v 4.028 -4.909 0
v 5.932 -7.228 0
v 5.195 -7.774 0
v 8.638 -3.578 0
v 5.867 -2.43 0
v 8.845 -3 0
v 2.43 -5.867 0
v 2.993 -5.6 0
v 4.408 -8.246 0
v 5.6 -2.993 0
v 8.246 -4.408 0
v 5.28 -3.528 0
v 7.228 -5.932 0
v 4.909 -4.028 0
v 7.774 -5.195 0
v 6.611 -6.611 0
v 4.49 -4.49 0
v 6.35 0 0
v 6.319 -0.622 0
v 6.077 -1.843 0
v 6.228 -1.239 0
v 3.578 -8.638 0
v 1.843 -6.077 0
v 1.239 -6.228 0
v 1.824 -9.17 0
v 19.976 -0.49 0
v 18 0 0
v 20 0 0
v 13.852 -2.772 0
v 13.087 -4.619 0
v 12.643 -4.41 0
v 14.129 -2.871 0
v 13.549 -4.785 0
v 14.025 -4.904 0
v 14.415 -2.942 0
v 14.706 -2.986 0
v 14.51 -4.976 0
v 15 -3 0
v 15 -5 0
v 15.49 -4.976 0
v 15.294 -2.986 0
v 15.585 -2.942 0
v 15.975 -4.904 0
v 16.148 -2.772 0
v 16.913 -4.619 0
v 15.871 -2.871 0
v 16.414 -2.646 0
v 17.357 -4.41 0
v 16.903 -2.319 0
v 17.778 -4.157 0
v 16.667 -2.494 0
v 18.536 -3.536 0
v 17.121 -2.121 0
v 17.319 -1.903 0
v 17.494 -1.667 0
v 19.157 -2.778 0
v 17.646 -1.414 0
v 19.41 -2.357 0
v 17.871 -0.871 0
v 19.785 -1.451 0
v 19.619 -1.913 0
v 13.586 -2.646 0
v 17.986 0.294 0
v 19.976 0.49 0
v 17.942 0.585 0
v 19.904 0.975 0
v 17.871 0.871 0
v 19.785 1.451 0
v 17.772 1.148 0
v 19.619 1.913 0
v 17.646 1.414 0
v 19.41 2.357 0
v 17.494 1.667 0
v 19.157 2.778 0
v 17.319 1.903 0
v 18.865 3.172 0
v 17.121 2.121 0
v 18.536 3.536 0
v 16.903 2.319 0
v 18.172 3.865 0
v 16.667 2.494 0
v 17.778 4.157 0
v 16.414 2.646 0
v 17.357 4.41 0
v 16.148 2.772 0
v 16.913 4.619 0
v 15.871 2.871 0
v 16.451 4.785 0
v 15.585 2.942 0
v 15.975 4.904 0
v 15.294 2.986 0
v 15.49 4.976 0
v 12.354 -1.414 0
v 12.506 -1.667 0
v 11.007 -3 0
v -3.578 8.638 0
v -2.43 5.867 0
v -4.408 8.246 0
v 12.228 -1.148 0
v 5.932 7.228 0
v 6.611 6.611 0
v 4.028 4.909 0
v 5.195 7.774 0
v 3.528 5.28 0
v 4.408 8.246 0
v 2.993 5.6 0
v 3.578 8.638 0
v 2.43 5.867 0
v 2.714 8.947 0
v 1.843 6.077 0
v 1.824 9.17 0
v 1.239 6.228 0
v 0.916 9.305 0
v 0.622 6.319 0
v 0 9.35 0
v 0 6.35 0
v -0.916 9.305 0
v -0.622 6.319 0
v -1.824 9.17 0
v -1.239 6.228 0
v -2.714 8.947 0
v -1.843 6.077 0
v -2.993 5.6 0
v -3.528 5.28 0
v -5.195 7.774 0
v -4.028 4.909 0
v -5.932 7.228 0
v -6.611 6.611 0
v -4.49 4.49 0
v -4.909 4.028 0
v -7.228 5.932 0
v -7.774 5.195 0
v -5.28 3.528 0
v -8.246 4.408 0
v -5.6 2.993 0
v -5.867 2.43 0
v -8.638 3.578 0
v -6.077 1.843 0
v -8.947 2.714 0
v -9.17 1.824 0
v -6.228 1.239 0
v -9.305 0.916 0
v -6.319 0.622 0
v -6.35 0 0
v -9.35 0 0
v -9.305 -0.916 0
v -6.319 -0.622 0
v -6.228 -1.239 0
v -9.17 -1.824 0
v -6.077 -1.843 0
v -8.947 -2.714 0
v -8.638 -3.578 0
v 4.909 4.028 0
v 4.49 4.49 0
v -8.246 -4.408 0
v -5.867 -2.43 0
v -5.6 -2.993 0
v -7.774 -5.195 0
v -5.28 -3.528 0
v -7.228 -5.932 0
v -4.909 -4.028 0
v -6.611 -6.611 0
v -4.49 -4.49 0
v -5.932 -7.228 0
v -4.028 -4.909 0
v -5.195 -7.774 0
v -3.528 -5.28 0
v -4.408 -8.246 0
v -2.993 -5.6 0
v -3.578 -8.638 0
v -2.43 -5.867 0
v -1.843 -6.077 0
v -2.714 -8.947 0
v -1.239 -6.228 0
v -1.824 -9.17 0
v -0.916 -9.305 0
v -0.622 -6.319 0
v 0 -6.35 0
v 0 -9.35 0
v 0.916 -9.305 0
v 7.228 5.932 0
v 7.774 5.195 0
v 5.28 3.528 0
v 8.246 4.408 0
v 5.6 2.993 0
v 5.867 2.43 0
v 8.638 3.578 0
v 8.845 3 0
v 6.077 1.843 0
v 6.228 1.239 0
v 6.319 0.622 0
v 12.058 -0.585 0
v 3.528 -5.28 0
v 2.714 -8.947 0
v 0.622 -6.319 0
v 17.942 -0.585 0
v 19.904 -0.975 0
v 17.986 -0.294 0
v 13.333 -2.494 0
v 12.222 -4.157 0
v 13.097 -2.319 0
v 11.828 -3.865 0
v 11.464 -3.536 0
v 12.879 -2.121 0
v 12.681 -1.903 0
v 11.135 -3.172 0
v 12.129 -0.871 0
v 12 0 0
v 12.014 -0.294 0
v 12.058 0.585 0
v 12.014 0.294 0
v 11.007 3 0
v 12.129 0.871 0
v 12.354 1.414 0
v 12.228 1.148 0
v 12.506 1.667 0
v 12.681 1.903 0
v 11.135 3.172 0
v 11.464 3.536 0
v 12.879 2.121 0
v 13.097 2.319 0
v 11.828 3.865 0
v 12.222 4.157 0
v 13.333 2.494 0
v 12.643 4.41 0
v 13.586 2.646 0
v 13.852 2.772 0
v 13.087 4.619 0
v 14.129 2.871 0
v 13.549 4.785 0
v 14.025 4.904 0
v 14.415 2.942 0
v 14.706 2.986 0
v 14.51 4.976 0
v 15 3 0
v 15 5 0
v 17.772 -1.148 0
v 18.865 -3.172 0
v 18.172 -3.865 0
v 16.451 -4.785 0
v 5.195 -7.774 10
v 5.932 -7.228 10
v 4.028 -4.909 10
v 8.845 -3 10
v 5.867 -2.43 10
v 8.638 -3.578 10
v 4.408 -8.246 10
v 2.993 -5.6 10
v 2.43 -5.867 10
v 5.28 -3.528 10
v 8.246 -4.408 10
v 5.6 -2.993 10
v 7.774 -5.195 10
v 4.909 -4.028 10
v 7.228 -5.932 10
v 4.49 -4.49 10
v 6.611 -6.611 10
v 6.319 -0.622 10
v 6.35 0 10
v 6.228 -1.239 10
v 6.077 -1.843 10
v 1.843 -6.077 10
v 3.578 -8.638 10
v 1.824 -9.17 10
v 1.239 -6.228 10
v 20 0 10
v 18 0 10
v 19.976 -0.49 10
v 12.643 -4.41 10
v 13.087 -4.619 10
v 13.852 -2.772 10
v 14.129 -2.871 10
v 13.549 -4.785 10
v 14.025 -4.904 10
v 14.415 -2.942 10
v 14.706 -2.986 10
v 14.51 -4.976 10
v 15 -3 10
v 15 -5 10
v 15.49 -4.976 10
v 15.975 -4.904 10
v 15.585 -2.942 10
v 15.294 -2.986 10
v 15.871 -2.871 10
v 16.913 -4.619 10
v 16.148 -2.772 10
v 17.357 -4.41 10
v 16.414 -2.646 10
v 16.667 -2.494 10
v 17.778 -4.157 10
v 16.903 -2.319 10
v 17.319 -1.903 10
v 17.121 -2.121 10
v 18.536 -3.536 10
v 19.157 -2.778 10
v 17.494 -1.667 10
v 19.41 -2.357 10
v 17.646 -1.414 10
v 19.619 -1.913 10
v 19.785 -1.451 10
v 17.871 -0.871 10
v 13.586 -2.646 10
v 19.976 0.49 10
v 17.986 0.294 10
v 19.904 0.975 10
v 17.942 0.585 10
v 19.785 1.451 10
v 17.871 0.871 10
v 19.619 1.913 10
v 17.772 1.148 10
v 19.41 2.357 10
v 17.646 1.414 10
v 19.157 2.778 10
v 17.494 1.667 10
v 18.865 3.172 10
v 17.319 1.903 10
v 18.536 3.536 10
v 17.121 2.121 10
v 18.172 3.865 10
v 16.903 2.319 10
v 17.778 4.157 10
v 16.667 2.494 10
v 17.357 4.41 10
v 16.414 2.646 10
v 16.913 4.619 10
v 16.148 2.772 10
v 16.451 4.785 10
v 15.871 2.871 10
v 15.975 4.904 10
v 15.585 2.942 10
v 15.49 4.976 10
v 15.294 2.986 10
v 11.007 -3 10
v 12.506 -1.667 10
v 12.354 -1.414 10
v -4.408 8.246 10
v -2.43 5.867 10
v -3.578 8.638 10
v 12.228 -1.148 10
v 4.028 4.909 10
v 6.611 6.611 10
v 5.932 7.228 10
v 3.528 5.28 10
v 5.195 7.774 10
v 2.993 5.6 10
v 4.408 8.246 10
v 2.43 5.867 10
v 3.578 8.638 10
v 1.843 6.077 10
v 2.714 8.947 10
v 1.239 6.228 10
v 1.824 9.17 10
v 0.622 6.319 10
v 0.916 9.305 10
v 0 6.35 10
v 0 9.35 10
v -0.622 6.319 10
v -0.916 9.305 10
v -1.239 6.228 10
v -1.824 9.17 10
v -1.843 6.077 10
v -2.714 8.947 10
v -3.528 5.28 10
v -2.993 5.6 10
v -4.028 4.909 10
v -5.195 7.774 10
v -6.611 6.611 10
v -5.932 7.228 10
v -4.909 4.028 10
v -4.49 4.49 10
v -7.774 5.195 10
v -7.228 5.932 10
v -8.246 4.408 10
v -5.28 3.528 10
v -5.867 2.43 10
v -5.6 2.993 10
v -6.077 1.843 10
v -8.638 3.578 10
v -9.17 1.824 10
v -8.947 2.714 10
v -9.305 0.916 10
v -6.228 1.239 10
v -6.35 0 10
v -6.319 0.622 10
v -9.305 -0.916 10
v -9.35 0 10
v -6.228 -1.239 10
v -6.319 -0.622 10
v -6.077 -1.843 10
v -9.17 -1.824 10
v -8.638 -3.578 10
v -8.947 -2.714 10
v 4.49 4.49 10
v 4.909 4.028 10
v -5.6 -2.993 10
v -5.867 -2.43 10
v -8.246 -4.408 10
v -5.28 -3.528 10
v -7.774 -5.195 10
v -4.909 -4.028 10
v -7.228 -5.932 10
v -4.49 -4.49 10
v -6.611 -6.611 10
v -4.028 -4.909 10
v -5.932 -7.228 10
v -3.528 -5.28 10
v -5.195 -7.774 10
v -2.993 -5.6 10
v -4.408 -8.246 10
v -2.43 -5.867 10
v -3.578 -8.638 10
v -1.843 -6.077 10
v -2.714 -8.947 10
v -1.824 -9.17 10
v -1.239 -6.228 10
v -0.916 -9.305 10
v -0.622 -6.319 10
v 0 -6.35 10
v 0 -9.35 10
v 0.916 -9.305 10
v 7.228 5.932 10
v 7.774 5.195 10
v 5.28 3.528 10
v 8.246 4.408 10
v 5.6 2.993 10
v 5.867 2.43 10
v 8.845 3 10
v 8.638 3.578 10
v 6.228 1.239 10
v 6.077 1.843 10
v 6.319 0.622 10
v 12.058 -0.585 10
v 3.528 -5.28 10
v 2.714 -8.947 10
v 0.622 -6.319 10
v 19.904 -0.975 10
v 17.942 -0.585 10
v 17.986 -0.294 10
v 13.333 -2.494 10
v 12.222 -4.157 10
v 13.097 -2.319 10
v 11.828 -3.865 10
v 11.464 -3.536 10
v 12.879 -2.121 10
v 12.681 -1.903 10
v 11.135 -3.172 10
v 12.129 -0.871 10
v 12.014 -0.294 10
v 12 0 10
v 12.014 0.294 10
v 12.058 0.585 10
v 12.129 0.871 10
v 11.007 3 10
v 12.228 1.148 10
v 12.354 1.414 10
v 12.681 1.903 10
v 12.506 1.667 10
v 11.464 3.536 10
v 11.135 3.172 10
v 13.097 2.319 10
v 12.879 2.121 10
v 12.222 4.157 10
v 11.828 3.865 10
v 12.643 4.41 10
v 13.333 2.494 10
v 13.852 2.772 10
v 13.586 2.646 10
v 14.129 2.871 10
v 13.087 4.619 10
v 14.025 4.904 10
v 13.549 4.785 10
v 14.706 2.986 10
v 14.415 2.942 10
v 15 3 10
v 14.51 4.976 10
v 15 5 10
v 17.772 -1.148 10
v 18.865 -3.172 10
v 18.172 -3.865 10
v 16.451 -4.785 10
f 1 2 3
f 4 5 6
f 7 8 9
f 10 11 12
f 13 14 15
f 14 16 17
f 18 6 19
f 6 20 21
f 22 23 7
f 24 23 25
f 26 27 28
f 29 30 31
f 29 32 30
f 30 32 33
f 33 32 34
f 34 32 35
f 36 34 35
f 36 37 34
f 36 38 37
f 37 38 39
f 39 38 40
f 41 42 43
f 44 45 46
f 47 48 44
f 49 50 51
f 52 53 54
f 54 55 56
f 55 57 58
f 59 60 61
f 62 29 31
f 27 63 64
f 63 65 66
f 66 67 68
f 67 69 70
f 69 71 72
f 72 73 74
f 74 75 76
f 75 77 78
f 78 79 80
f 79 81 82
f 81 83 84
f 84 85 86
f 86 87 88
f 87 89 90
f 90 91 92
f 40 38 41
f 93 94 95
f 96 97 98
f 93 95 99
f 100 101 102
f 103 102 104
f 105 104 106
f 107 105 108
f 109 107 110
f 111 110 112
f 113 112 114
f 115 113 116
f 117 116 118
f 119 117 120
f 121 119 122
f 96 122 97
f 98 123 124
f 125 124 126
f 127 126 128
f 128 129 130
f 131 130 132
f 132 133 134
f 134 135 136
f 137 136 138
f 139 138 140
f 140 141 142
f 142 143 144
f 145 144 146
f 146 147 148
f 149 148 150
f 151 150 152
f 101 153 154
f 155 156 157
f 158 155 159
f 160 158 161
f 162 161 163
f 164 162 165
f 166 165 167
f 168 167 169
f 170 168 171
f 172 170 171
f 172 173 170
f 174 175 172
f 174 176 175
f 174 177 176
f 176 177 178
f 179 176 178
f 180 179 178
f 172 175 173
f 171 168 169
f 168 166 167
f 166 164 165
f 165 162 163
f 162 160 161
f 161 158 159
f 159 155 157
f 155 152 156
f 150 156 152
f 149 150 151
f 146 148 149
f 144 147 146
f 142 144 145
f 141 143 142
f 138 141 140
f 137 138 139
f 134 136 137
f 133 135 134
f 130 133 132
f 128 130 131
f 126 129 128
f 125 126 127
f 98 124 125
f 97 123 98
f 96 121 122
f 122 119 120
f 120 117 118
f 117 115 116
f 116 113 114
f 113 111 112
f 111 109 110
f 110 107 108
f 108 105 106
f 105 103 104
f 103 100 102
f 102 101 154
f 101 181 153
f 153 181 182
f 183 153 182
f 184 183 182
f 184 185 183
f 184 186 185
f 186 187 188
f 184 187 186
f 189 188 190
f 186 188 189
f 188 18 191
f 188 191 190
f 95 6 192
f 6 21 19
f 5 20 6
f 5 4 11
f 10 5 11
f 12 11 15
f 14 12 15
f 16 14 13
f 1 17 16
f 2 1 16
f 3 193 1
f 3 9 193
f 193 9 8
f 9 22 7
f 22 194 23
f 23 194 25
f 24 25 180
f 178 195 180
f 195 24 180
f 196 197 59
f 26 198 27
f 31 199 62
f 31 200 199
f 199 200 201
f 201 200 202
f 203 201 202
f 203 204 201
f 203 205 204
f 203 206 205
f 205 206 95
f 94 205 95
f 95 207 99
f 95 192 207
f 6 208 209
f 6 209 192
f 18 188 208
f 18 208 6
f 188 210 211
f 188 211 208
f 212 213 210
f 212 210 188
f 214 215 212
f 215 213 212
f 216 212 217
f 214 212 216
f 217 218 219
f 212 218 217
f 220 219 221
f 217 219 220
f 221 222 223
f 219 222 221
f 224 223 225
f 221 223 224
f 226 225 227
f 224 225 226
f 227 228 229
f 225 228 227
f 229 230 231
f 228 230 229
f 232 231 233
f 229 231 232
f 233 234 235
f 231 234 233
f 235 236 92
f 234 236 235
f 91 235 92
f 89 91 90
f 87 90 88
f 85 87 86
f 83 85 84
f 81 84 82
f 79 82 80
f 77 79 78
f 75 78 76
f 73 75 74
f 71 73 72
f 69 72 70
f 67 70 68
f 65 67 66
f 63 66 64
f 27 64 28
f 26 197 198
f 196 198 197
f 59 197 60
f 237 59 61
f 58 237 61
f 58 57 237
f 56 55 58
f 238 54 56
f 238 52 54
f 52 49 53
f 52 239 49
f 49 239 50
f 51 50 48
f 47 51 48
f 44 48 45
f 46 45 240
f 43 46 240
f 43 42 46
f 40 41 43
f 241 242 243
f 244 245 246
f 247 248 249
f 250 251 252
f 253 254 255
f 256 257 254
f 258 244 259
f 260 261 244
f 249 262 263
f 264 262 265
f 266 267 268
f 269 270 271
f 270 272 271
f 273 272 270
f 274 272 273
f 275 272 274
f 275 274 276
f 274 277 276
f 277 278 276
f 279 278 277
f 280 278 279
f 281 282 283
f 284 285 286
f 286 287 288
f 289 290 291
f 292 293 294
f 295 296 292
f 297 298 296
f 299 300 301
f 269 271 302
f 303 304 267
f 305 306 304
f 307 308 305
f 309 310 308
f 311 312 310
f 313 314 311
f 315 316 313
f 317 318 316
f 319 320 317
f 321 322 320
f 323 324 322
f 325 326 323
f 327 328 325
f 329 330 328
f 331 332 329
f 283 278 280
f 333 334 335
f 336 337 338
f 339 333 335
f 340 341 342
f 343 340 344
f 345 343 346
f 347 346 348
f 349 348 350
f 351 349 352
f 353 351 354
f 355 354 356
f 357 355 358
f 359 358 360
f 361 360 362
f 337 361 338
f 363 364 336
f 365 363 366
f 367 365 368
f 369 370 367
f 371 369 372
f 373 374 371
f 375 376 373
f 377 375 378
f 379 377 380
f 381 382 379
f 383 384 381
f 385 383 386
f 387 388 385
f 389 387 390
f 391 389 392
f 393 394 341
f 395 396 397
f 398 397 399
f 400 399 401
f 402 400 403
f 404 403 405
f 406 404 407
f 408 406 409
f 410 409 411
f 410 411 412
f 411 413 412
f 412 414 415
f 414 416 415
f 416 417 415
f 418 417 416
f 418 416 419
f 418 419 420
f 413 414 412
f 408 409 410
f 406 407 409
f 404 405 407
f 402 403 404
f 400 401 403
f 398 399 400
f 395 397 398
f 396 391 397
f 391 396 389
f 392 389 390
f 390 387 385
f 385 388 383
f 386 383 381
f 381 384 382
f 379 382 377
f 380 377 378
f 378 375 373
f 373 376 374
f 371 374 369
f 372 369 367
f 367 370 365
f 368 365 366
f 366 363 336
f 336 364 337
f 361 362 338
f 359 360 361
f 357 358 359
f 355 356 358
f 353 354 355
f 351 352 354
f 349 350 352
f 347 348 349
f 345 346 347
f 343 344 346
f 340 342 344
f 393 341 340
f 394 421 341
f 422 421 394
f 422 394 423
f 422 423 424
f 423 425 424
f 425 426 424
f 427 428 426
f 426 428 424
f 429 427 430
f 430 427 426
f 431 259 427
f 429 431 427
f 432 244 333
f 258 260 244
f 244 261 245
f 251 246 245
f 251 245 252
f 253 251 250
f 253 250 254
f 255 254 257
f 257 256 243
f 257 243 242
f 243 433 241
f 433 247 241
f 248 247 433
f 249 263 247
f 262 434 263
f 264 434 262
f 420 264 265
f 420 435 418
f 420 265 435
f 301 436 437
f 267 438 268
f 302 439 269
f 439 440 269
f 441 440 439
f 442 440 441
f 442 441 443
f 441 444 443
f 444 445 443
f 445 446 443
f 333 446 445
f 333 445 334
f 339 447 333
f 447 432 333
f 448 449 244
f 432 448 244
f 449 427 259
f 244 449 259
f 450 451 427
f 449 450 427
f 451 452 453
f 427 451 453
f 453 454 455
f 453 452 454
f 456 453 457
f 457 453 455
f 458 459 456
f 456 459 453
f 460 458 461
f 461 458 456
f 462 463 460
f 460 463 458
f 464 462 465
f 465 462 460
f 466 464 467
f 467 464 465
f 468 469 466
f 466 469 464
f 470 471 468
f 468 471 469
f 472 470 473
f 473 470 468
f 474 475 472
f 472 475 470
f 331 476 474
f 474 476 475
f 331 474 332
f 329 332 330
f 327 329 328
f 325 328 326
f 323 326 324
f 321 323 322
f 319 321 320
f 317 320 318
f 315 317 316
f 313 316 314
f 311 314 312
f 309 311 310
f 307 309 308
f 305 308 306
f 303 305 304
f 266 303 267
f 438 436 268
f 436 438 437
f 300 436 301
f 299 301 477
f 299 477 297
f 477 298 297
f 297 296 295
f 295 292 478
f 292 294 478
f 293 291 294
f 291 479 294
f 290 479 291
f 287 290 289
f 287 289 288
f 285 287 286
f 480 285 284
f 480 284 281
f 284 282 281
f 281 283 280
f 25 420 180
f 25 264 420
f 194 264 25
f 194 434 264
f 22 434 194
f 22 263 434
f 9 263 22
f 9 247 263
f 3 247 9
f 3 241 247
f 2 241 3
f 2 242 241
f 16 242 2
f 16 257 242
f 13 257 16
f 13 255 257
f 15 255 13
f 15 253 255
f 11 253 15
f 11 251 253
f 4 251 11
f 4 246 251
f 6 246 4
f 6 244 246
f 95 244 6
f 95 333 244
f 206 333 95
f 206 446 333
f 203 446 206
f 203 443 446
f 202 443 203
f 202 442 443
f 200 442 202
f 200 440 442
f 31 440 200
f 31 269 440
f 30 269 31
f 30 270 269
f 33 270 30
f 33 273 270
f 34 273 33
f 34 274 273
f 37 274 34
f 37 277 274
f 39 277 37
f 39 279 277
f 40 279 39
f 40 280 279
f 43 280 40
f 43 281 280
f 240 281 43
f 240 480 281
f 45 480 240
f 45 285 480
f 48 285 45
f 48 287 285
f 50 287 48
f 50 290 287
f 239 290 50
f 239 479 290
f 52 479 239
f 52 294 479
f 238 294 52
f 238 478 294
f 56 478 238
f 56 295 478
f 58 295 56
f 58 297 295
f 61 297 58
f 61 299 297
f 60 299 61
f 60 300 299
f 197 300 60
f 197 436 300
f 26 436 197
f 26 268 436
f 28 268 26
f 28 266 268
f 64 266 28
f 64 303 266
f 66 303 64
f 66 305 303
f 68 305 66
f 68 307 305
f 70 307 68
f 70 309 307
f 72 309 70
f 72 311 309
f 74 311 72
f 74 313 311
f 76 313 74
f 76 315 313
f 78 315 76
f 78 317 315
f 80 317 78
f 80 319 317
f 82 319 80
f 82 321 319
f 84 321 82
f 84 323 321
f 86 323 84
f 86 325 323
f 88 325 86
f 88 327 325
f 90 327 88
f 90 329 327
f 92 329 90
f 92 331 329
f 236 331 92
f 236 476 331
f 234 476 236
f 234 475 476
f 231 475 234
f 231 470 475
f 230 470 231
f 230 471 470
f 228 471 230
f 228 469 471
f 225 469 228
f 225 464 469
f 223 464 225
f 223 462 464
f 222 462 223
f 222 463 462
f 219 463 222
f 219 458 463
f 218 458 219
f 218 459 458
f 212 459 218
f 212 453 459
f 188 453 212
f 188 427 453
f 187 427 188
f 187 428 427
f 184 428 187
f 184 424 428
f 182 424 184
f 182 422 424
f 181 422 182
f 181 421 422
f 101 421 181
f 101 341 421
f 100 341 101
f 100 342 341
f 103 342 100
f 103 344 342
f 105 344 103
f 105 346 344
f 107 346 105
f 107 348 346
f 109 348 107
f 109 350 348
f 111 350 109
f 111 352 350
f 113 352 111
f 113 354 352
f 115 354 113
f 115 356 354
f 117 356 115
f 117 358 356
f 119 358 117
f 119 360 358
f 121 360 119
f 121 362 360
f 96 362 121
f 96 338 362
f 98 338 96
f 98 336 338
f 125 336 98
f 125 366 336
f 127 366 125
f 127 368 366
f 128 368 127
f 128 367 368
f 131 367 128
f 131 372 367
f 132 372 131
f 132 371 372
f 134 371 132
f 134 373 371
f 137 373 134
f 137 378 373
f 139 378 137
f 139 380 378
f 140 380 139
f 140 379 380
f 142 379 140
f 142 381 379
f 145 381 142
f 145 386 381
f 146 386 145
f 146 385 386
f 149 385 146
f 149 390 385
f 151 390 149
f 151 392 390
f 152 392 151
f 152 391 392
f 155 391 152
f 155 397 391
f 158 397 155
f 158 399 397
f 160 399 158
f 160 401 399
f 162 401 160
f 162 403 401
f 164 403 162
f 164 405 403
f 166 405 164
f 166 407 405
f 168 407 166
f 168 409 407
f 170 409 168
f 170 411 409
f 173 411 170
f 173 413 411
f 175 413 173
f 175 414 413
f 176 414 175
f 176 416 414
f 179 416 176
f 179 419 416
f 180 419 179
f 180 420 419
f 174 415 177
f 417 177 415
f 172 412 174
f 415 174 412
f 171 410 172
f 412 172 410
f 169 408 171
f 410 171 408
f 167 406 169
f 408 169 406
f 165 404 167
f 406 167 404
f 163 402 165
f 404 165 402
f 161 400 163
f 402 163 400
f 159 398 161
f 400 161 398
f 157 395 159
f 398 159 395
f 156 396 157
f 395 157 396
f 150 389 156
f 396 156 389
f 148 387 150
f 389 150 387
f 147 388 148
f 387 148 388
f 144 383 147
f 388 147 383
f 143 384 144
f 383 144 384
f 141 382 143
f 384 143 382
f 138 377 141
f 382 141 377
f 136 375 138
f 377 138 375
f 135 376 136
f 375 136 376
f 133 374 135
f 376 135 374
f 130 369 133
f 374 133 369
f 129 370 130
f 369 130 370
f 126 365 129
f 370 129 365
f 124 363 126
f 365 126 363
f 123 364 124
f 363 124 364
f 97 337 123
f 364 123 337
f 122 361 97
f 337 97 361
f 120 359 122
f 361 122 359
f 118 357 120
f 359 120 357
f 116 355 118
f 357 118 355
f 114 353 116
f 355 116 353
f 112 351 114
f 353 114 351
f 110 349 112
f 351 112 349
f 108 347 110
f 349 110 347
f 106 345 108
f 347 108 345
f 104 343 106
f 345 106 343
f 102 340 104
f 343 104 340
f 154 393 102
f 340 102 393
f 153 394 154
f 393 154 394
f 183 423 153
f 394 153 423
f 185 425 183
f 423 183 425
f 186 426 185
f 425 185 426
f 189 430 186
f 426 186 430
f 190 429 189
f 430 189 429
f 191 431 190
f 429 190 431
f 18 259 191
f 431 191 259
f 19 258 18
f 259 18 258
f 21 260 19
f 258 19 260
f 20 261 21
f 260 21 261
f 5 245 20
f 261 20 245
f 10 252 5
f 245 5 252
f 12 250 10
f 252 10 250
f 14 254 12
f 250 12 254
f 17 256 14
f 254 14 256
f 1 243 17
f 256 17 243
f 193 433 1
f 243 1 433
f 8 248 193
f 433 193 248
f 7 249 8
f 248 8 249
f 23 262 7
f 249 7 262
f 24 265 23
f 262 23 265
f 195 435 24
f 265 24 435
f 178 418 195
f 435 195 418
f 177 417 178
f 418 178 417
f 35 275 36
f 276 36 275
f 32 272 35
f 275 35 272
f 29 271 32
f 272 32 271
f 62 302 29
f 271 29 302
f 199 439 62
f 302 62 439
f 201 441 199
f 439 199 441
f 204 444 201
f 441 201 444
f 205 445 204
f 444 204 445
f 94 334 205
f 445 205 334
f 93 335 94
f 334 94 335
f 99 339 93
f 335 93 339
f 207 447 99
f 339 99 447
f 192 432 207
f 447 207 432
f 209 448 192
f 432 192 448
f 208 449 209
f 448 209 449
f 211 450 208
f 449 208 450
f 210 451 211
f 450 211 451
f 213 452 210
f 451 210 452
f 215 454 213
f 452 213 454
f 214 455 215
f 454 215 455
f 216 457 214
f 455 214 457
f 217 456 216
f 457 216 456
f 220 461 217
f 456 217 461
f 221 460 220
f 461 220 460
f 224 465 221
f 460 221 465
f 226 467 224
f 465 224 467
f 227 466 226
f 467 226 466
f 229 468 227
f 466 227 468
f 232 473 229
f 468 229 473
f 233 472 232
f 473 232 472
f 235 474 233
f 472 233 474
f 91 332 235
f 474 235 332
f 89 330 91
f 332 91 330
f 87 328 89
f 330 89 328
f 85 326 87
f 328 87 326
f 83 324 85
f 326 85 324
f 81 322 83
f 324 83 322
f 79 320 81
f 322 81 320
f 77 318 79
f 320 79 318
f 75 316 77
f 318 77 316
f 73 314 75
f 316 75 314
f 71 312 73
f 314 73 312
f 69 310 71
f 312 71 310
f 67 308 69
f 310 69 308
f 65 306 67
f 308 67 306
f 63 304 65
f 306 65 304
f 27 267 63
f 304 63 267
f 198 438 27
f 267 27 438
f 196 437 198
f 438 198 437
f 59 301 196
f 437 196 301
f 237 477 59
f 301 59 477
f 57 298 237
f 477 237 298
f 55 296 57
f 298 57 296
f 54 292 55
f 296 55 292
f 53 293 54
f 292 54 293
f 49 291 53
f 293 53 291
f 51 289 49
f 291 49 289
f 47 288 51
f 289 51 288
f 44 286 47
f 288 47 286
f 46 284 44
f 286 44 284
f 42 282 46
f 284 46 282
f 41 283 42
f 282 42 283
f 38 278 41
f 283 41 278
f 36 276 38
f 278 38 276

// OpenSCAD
// Snap-on clip for 12.7 mm lab stand rod and 6 mm ID tubing
// Printed flat (Z = 10 mm extrusion of XY profile)

// Global settings
$fn = 64;
height = 10; // Extrusion height in Z

// Rod ring dimensions
rod_id = 12.7; // Inner diameter of rod ring
rod_wall = 3; // Wall thickness of rod ring
rod_od = rod_id + 2 * rod_wall; // Outer diameter of rod ring (18.7 mm)

// Rod ring cutout dimensions
rod_cutout_width = 10; // Width of the opening on the -X side
rod_cutout_half_width = rod_cutout_width / 2; // Half-width for symmetric bounds

// Tubing ring dimensions
tubing_id = 6; // Inner diameter of tubing ring
tubing_wall = 2; // Wall thickness of tubing ring
tubing_od = tubing_id + 2 * tubing_wall; // Outer diameter of tubing ring (10 mm)
tubing_center_x = 15; // X-coordinate of tubing ring center

// Tubing ring cutout dimensions
tubing_cutout_width = 4.5; // Width of the opening on the +X side
tubing_cutout_half_width = tubing_cutout_width / 2; // Half-width for symmetric bounds

// Bridge dimensions
bridge_x_start = 8; // Start X of the bridge
bridge_x_end = 12; // End X of the bridge
bridge_width = 6; // Width of the bridge in Y
bridge_half_width = bridge_width / 2; // Half-width for symmetric bounds

// Safety margin for cuts (ensures no coplanar faces)
cut_margin = 0.5;

// Main module
linear_extrude(height = height, center = false, convexity = 10) {
    union() {
        // Rod ring centered at origin
        difference() {
            // Outer circle of rod ring
            circle(r = rod_od / 2);
            // Inner hole of rod ring
            circle(r = rod_id / 2);
            // Cutout on -X side: removes everything with x < 0 and -5 < y < 5
            // We use a large rectangle extending far to the left to ensure full cut
            translate([-rod_od - cut_margin, 0])
                square([rod_od + cut_margin, rod_cutout_width + 2 * cut_margin], center = true);
        }

        // Tubing ring centered at (15, 0)
        difference() {
            // Outer circle of tubing ring
            translate([tubing_center_x, 0])
                circle(r = tubing_od / 2);
            // Inner hole of tubing ring
            translate([tubing_center_x, 0])
                circle(r = tubing_id / 2);
            // Cutout on +X side: removes everything with x > 15 and -2.25 < y < 2.25
            // We use a large rectangle extending far to the right to ensure full cut
            translate([tubing_center_x + tubing_od + cut_margin, 0])
                square([tubing_od + cut_margin, tubing_cutout_width + 2 * cut_margin], center = true);
        }

        // Solid bridge between x = 8 and x = 12, width 6 mm in Y
        // Centered on Y axis
        translate([bridge_x_start, -bridge_half_width])
            square([bridge_x_end - bridge_x_start, bridge_width]);
    }
}
